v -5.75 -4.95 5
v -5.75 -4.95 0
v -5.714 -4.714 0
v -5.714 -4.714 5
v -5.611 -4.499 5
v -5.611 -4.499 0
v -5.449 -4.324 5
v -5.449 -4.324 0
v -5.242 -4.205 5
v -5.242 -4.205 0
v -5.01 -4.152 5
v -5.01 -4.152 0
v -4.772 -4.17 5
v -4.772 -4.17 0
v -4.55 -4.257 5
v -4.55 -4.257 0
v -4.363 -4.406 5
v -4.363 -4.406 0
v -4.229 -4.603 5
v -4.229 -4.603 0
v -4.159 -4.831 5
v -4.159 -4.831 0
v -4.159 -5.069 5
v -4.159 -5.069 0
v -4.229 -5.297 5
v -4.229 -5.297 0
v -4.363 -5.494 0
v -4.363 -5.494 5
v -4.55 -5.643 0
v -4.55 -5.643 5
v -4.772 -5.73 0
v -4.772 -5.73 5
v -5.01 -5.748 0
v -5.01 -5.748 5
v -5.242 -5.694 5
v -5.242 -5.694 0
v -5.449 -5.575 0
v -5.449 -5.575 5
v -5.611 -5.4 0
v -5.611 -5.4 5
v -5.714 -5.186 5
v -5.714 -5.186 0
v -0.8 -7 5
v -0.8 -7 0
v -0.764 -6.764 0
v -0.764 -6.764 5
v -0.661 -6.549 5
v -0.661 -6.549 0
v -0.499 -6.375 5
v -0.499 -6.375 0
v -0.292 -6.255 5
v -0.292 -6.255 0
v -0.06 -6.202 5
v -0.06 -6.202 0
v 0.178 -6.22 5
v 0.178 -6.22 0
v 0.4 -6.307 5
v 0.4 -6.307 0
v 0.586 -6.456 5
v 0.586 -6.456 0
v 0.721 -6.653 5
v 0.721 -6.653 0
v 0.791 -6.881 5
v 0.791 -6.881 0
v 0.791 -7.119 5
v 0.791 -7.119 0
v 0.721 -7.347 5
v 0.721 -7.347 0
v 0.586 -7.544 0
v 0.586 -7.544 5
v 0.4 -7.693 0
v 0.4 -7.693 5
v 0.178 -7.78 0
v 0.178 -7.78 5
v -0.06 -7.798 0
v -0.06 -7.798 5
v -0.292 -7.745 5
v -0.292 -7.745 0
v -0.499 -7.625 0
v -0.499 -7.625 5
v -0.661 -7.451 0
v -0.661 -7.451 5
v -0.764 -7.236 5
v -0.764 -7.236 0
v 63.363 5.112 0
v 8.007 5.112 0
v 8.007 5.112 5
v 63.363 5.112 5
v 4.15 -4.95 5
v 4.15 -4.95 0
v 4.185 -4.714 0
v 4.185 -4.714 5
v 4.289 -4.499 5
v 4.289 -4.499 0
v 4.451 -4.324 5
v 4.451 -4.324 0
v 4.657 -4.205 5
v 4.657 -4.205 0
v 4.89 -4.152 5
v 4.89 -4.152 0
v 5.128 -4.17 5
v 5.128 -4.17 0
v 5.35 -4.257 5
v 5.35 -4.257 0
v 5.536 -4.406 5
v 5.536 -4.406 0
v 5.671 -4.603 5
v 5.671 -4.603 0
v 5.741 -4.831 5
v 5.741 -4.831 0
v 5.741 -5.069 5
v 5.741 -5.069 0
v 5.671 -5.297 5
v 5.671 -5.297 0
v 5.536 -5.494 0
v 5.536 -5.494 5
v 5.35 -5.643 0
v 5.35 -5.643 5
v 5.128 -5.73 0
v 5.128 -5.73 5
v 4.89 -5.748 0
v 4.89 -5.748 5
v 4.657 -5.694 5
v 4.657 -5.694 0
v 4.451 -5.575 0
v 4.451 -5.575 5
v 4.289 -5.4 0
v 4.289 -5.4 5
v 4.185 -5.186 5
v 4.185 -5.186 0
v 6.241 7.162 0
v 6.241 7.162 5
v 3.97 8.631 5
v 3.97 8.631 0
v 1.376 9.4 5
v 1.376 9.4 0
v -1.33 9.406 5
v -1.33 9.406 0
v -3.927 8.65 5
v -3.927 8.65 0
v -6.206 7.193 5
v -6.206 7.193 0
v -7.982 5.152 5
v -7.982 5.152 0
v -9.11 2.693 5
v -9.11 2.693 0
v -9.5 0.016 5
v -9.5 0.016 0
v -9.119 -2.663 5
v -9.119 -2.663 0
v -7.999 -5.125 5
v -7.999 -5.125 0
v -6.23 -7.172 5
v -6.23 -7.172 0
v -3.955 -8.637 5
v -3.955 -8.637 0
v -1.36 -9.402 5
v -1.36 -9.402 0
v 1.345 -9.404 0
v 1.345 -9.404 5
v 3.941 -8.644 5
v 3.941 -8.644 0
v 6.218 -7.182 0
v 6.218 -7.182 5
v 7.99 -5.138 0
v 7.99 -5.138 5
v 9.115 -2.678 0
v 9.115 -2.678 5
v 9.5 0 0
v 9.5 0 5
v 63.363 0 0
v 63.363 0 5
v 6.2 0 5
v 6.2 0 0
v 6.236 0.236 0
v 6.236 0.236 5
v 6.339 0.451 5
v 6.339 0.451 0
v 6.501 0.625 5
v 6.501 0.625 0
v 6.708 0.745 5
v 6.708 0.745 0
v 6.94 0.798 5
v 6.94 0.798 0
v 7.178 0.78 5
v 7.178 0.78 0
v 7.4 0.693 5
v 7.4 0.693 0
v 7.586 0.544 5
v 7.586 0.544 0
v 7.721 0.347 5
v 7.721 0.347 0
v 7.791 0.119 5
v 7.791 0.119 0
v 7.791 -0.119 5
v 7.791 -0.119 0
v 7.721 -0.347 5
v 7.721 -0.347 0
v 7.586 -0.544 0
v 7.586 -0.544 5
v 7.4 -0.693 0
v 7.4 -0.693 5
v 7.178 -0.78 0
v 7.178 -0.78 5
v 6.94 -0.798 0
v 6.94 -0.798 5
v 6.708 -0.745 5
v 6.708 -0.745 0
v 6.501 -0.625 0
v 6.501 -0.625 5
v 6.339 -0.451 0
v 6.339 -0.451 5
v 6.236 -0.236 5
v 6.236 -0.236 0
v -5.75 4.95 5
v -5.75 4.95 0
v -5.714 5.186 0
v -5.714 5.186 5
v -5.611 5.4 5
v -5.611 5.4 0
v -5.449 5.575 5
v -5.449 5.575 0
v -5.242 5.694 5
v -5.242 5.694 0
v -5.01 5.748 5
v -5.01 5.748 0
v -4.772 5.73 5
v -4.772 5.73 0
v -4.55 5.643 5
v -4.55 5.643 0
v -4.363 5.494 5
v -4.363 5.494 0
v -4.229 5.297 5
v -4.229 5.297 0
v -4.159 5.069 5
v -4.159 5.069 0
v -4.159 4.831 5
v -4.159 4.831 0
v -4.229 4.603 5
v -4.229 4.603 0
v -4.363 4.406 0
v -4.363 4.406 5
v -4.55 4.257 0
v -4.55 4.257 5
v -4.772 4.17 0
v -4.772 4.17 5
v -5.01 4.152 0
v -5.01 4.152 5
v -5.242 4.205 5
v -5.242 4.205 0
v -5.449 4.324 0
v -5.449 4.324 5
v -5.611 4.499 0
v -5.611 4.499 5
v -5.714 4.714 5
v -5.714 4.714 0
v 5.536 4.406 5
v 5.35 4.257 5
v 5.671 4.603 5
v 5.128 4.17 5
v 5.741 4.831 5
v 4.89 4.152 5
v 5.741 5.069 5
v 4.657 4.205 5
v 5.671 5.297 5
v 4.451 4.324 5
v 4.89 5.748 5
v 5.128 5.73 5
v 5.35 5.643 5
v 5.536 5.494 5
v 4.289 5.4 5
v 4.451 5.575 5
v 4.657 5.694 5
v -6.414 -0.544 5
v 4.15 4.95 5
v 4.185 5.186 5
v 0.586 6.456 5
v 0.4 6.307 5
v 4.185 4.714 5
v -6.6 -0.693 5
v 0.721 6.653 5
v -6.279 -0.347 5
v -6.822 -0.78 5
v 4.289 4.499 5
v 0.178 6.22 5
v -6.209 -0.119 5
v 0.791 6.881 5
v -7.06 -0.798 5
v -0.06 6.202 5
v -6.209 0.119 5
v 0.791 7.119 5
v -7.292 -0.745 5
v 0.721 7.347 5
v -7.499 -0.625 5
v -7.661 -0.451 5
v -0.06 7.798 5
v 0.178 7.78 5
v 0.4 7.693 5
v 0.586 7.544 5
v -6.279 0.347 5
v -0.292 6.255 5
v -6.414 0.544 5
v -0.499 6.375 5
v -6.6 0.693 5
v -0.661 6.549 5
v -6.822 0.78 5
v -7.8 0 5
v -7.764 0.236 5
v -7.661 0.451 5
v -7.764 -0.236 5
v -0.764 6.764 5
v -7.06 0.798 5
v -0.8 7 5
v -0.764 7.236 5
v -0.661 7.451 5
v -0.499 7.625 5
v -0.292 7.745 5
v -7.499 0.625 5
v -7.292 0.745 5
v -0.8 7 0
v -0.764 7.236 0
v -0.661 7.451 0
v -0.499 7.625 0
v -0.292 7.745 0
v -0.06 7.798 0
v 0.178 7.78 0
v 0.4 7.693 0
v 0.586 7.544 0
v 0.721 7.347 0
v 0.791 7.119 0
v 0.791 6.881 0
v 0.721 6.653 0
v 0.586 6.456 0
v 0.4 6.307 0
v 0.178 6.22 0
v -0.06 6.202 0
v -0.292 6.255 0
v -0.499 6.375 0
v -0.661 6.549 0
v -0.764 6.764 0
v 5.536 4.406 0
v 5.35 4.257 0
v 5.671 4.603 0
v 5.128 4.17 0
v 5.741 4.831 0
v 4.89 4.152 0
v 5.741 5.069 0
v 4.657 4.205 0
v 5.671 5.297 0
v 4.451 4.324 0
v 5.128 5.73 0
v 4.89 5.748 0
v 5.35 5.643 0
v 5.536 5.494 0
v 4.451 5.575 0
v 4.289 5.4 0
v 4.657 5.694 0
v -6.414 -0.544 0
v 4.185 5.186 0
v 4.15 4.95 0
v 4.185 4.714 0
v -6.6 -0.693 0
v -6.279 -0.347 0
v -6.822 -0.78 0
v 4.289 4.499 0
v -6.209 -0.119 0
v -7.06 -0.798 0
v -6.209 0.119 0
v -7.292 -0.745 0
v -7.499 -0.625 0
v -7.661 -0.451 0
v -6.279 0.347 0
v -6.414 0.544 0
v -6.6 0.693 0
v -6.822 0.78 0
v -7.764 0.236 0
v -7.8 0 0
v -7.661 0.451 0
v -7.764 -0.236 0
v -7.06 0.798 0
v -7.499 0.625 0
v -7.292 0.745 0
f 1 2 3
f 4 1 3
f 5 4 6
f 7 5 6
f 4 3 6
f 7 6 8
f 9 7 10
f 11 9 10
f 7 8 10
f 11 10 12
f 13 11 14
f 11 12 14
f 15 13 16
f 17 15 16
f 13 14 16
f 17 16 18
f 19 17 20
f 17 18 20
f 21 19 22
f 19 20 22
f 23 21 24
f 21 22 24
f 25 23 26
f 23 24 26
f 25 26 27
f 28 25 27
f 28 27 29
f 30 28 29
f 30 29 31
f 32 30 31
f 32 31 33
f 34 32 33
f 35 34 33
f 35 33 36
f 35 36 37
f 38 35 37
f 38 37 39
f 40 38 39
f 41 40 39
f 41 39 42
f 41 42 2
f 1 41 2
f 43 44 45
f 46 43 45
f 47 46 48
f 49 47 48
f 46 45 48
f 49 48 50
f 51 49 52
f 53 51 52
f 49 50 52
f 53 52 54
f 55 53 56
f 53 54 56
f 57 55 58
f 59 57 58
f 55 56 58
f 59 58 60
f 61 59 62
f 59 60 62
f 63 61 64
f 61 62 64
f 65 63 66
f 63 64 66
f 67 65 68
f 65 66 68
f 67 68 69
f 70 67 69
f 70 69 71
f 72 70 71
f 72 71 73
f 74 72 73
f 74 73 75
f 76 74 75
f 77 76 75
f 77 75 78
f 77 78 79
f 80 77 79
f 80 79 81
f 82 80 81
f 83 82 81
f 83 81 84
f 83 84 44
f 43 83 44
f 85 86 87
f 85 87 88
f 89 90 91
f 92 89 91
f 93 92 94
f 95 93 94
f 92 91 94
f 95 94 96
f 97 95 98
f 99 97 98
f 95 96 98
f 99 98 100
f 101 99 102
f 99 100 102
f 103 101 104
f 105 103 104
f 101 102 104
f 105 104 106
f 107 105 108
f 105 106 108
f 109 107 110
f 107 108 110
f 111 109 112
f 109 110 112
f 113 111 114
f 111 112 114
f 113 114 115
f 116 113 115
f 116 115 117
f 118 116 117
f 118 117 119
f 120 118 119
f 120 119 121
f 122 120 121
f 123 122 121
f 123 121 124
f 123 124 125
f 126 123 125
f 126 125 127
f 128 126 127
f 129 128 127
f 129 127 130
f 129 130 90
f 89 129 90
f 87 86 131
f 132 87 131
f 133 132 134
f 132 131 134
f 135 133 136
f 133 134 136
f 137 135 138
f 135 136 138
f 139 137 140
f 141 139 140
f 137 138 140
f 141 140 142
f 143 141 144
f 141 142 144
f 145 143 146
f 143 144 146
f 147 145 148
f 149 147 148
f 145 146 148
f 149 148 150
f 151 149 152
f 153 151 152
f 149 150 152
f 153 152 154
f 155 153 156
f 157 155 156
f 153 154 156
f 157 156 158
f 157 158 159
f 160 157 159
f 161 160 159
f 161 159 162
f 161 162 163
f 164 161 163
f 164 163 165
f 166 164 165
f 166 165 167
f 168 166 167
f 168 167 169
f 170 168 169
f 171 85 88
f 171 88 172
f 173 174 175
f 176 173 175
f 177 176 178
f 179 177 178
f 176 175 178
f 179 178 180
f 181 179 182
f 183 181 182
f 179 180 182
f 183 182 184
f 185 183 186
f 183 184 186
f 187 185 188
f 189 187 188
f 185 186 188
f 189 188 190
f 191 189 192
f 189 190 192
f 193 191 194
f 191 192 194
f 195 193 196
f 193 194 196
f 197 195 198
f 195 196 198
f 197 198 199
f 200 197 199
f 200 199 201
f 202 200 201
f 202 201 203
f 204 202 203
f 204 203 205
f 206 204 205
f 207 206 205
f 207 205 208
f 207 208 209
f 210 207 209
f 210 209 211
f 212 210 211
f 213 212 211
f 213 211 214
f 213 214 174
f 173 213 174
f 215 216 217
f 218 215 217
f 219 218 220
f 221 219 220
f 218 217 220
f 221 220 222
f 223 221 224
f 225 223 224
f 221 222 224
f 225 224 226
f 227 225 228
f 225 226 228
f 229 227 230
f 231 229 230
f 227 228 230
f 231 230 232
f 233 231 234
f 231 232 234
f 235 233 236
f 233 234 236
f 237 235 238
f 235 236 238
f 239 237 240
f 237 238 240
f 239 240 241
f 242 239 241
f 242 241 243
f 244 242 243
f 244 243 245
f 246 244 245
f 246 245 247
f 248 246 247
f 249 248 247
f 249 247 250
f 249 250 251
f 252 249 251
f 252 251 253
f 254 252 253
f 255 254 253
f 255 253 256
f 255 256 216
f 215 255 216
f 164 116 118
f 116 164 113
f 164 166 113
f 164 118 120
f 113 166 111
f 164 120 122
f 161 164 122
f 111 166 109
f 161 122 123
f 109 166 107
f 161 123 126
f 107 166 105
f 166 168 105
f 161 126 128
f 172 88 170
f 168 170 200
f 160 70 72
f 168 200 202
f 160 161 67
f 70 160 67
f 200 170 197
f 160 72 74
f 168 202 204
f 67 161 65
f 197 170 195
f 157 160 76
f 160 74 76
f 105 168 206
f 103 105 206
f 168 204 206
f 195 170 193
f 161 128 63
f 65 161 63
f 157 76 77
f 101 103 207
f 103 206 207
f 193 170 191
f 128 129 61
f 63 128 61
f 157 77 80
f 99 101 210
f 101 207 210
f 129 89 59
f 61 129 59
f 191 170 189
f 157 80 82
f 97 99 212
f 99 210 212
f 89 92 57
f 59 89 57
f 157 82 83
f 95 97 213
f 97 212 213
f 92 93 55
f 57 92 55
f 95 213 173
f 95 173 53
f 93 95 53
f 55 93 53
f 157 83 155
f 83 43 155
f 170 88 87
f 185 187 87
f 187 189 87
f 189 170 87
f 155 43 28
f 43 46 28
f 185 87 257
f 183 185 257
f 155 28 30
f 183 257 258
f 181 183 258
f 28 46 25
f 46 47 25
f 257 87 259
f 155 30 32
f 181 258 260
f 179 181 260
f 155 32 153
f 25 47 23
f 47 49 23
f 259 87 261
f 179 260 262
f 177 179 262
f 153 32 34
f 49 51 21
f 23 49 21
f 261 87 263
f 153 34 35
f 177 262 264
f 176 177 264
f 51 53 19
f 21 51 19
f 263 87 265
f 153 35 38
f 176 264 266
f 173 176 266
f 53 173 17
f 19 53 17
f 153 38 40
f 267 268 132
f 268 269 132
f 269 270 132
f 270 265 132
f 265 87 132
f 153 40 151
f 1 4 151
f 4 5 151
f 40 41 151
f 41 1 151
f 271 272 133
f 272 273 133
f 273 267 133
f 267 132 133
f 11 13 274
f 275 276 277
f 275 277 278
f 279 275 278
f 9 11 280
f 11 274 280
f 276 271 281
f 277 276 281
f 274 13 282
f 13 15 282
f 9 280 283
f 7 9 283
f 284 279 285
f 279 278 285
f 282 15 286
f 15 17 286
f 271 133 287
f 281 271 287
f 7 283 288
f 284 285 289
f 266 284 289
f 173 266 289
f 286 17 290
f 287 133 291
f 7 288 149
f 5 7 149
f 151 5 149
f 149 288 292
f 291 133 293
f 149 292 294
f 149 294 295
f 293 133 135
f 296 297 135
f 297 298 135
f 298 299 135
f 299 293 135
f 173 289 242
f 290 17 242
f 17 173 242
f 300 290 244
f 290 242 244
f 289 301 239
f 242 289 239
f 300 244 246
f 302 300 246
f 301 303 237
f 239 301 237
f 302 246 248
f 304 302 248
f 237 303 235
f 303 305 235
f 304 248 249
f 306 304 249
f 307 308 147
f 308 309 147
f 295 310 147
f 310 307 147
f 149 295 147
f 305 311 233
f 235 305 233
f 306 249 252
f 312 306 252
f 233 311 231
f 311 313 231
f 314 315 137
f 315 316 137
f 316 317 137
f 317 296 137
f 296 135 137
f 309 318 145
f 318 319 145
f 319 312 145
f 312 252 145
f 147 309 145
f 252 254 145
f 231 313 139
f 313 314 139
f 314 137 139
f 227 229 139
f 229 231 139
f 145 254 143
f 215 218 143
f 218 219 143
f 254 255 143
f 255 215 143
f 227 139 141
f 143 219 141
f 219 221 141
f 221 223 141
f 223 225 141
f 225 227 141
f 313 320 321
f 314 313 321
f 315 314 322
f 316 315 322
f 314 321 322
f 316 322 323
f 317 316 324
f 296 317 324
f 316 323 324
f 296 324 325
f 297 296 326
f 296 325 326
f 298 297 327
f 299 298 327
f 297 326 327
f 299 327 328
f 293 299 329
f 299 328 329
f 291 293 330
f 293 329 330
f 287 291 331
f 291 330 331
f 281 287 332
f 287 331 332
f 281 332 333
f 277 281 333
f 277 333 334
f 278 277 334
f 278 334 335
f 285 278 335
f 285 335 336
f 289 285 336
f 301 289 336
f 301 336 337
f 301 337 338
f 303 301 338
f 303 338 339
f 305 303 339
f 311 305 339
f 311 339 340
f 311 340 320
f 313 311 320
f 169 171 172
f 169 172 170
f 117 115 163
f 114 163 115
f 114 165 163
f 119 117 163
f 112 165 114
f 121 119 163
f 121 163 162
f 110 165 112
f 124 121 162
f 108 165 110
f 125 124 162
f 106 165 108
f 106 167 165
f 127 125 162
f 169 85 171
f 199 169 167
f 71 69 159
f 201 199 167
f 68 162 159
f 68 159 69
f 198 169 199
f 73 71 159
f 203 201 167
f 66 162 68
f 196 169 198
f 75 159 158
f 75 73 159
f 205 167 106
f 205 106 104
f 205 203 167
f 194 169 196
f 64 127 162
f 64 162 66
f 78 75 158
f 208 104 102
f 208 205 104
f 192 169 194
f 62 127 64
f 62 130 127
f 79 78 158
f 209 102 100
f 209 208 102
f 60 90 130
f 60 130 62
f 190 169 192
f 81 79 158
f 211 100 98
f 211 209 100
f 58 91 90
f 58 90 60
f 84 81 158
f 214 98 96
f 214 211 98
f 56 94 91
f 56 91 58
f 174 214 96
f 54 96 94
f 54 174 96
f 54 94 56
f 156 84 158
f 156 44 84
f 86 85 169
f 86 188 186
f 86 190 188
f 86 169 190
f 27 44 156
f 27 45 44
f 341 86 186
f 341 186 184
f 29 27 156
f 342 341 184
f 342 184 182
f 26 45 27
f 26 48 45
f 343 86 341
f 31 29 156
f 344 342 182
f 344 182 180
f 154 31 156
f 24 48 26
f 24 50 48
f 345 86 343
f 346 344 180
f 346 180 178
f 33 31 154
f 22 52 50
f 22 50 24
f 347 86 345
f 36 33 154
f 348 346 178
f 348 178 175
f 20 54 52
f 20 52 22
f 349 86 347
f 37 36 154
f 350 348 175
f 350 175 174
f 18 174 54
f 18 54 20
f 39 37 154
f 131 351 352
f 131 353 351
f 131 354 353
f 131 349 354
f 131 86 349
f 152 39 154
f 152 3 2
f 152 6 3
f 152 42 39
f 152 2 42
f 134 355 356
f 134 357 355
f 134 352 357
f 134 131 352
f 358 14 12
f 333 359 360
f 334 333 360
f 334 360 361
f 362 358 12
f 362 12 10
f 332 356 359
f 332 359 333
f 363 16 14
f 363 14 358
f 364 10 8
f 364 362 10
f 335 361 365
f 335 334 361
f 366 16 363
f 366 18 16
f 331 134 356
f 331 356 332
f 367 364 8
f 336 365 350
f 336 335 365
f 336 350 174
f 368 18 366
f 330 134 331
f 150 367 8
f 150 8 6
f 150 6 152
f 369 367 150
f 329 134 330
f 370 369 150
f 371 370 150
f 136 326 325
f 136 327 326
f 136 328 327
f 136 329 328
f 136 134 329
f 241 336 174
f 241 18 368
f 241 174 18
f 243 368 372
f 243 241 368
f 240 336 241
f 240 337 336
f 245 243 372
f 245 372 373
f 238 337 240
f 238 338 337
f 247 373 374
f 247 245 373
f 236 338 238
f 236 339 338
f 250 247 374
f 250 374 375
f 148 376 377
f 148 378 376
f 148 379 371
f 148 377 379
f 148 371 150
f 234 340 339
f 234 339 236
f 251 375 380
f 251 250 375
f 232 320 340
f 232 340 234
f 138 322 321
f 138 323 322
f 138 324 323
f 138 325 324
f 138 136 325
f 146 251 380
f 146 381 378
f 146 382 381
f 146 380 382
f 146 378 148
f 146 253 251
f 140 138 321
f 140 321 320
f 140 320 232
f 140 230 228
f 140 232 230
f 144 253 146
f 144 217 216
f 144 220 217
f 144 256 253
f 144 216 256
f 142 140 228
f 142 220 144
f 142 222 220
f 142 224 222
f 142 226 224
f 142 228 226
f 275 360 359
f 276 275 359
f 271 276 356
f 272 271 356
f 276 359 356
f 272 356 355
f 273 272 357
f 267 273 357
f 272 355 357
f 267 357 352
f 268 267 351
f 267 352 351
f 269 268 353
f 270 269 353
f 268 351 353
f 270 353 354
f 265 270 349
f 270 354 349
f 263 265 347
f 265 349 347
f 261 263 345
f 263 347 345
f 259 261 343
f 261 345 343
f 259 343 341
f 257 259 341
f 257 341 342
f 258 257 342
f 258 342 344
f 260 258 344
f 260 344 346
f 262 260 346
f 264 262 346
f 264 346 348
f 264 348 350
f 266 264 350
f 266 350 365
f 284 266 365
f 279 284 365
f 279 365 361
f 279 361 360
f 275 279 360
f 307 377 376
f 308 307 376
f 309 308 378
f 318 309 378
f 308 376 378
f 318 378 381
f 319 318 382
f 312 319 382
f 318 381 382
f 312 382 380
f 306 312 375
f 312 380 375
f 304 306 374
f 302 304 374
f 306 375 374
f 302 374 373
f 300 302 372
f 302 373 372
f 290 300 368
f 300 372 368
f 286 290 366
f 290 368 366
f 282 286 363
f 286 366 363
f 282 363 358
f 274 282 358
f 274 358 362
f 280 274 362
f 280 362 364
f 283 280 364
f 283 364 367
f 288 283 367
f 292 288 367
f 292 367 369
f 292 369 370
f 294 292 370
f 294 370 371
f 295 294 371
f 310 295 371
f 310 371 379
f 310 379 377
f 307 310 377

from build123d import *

# Parameters (mm, degrees)
SKETCH1_R           = 9.5
BOSS_EXTRUDE1_DEPTH = 5
BOSS_EXTRUDE2_DEPTH = 5
SKETCH4_R           = 0.8
CUT_EXTRUDE1_DEPTH  = 65.265761039


with BuildPart() as part:
    # Sketch1 → Boss-Extrude1 (new body)
    with BuildSketch(Plane.XY):
        Circle(SKETCH1_R)
    extrude(amount=BOSS_EXTRUDE1_DEPTH)

    # Sketch3 → Boss-Extrude2 (add)
    with BuildSketch(Plane(origin=(0, 0, 0), x_dir=(-1, 0, 0), z_dir=(0, 0, -1))):
        with BuildLine():
            Line((-8.007166595, 5.112267903), (-63.36274964, 5.112267903))
            Line((-63.36274964, 5.112267903), (-63.36274964, 0))
            Line((-63.36274964, 0), (-9.5, 0))
            ThreePointArc((-9.5, 0), (-9.119157929, 2.662885403), (-8.007166595, 5.112267903))
        make_face()
    extrude(amount=-BOSS_EXTRUDE2_DEPTH)

    # Sketch4 → Cut-Extrude1 (cut, through all)
    with BuildSketch(Plane(origin=(0, 0, 0), x_dir=(-1, 0, 0), z_dir=(0, 0, -1))):
        with Locations((0, 7)):
            Circle(SKETCH4_R)
        with Locations((4.949747468, 4.949747468)):
            Circle(SKETCH4_R)
        with Locations((7, 0)):
            Circle(SKETCH4_R)
        with Locations((4.949747468, -4.949747468)):
            Circle(SKETCH4_R)
        with Locations((0, -7)):
            Circle(SKETCH4_R)
        with Locations((-4.949747468, -4.949747468)):
            Circle(SKETCH4_R)
        with Locations((-7, 0)):
            Circle(SKETCH4_R)
        with Locations((-4.949747468, 4.949747468)):
            Circle(SKETCH4_R)
    extrude(amount=-CUT_EXTRUDE1_DEPTH, mode=Mode.SUBTRACT)


solid = part.part
